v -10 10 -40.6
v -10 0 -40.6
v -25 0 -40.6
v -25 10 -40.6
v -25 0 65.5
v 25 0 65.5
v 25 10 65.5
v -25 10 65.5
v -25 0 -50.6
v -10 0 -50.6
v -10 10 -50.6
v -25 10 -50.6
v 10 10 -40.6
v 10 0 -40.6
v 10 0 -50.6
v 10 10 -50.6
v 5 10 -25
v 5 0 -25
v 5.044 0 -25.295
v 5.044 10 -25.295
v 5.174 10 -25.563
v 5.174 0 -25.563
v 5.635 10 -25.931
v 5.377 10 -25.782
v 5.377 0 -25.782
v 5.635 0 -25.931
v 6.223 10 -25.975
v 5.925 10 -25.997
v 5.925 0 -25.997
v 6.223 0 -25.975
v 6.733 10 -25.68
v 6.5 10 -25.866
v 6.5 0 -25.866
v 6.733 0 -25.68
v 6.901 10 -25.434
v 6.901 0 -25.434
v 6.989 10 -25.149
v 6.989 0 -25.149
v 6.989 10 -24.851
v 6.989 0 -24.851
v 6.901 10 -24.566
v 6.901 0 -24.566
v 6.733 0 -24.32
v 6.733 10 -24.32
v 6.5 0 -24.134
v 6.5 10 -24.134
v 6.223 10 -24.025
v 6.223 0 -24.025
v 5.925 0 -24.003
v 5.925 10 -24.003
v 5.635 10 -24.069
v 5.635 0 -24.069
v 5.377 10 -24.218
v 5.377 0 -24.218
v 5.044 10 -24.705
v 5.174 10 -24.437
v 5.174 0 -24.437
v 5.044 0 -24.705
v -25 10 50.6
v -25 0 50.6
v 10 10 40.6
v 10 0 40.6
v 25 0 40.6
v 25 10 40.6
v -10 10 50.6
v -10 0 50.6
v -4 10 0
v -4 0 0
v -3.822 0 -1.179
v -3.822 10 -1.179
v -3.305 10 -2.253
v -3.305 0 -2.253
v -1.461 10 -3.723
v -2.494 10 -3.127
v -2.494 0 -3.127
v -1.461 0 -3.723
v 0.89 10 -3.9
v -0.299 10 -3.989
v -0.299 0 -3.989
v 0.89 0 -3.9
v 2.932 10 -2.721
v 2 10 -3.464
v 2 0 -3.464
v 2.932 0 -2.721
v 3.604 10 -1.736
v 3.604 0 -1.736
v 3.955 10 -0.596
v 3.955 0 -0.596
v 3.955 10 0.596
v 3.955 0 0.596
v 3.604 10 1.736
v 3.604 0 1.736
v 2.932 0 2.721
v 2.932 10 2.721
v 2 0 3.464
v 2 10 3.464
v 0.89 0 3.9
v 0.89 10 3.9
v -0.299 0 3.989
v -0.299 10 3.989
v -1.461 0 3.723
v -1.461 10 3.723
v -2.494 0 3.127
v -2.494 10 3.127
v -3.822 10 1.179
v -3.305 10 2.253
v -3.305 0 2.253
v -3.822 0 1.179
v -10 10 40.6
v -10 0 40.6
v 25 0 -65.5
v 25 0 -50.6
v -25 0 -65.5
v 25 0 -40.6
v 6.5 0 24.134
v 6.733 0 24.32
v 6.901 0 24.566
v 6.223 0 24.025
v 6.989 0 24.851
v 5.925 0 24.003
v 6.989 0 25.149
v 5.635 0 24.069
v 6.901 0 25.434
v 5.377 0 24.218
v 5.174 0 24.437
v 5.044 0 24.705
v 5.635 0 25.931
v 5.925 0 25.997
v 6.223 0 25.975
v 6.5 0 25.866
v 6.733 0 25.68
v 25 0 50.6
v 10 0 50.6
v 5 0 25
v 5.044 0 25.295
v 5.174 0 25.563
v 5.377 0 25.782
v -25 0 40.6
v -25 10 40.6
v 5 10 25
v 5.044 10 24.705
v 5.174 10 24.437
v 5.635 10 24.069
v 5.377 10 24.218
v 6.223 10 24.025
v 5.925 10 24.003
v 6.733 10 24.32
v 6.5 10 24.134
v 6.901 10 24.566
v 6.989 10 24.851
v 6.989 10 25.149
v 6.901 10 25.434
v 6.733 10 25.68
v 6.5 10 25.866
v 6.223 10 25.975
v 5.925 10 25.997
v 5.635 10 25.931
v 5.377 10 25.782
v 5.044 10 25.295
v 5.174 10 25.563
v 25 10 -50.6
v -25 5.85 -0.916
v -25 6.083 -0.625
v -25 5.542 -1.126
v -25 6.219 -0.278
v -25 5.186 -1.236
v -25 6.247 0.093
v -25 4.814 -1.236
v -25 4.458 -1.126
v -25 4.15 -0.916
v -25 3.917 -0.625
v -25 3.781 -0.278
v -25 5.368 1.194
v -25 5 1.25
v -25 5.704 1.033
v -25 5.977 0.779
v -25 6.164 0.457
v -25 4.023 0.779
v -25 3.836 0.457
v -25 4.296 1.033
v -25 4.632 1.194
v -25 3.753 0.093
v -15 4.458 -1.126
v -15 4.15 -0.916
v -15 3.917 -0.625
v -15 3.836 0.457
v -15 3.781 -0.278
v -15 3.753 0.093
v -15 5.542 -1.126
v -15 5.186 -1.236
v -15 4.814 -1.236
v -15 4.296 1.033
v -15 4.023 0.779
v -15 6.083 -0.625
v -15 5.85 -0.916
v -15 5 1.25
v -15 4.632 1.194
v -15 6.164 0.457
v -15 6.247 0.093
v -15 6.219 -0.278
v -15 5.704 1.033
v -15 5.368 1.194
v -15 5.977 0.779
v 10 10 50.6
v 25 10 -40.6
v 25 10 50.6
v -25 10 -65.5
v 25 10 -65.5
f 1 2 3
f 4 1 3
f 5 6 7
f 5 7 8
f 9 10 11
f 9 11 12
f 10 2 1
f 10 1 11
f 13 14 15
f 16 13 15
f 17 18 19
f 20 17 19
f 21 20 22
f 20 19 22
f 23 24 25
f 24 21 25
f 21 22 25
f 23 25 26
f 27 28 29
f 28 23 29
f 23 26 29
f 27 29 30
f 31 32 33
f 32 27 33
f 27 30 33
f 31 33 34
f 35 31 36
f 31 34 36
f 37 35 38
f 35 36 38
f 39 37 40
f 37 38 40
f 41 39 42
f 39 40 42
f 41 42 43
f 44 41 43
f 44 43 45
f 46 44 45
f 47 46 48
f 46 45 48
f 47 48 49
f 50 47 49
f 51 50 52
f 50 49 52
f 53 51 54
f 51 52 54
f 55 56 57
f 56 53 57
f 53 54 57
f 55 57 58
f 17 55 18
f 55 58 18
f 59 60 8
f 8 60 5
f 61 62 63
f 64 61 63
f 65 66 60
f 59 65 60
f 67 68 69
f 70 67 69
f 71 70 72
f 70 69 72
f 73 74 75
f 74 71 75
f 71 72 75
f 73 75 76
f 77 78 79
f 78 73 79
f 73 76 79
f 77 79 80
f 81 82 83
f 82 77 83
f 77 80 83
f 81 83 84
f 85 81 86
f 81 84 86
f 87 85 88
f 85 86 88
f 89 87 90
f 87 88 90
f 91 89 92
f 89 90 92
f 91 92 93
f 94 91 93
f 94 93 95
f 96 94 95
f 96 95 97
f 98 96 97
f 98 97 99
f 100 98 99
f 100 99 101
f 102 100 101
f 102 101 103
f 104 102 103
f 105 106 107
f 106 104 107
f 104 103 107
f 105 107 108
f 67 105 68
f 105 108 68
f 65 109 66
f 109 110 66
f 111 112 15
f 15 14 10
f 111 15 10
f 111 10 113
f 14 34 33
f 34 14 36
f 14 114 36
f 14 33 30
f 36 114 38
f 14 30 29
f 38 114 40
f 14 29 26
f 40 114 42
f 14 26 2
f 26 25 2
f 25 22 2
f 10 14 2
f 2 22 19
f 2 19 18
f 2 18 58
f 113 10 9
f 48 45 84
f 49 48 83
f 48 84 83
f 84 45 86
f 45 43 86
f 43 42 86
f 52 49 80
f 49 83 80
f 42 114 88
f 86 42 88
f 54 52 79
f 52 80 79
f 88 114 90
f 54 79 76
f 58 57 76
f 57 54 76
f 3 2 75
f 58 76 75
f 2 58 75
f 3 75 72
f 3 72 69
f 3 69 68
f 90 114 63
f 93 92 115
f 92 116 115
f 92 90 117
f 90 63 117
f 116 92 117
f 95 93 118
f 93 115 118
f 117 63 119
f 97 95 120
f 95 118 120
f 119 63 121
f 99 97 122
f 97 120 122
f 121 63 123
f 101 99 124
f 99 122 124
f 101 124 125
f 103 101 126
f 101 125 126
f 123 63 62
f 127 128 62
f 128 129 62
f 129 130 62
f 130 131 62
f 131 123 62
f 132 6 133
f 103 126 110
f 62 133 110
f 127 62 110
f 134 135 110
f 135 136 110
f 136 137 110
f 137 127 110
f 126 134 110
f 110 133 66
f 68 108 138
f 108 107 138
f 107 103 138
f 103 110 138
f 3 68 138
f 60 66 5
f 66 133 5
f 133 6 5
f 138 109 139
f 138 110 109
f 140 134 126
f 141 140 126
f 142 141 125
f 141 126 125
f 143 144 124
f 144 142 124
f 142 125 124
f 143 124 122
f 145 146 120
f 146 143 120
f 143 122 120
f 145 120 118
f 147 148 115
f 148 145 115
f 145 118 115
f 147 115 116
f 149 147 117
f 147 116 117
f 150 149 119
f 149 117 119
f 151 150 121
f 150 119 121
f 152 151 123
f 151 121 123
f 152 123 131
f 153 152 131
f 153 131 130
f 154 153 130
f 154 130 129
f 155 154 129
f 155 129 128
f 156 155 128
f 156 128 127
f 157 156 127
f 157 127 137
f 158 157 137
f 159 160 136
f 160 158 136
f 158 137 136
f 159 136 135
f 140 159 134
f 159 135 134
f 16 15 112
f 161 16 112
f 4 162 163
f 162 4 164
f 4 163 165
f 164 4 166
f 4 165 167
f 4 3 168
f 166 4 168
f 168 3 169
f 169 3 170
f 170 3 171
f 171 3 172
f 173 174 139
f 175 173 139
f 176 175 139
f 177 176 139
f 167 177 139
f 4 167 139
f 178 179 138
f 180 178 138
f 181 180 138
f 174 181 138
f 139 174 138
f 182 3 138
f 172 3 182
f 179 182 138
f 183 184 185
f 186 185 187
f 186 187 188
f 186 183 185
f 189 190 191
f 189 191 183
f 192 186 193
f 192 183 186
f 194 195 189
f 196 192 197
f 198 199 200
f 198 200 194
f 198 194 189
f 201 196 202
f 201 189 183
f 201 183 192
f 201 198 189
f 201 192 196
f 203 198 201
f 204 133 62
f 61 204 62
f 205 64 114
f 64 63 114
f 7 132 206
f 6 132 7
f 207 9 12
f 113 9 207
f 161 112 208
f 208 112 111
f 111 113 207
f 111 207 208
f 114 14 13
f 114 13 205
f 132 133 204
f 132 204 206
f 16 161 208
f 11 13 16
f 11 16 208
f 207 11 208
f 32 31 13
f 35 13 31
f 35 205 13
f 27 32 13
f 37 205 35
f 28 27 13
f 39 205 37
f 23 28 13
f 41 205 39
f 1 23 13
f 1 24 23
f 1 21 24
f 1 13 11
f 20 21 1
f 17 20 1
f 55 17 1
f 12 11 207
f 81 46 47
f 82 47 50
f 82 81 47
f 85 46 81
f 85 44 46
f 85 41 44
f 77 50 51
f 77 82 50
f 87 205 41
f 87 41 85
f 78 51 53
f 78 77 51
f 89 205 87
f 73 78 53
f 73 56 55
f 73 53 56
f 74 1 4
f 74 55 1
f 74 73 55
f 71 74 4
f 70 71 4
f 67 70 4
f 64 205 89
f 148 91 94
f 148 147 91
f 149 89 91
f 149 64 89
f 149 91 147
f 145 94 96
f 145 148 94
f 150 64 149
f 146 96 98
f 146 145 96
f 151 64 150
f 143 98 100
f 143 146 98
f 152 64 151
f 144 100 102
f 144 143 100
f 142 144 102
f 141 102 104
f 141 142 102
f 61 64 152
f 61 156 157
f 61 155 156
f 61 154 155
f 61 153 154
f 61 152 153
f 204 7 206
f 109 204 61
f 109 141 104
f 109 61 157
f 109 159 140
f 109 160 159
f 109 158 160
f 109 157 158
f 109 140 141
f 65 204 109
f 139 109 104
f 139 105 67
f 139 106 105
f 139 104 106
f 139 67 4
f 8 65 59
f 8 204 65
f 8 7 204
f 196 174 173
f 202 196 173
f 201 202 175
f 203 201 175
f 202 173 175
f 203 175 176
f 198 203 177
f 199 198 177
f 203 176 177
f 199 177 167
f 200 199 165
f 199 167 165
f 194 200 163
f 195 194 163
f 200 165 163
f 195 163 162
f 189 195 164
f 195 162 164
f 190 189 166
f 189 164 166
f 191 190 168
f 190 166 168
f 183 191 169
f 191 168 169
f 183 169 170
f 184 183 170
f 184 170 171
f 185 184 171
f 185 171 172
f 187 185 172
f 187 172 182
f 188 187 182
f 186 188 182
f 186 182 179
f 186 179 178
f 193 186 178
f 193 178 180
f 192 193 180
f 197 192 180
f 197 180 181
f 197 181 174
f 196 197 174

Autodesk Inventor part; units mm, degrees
ref_plane "YZ Plane" through (0, 0, 0) normal (1, 0, 0) x (0, 1, 0)
ref_plane "XZ Plane" through (0, 0, 0) normal (0, 1, 0) x (-1, 0, 0)
ref_plane "XY Plane" through (0, 0, 0) normal (0, 0, 1) x (1, 0, 0)
sketch "Sketch1" plane through (0, 0, 0) normal (0, 1, 0) x (-1, 0, 0)
  line L0 (25, -65.5) -> (-25, -65.5)
  line L1 (-25, 65.5) -> (25, 65.5)
  circle A0 centre (0, 0) radius 4
  circle A1 centre (-6, -25) radius 1
  circle A2 centre (-6, 25) radius 1
  line L2 (-25, 65.5) -> (-10, 65.5)
  line L3 (-10, 50.6) -> (-25, 50.6)
  line L4 (-25, 50.6) -> (-25, 65.5)
  line L5 (-25, 65.5) -> (-10, 65.5)
  line L6 (-10, 40.6) -> (-25, 40.6)
  line L7 (-25, -65.5) -> (-10, -65.5)
  line L8 (-10, -40.6) -> (-25, -40.6)
  line L9 (-25, -65.5) -> (-10, -65.5)
  line L10 (-10, -50.6) -> (-25, -50.6)
  line L11 (-25, -50.6) -> (-25, -65.5)
  line L12 (25, -65.5) -> (10, -65.5)
  line L13 (10, -40.6) -> (25, -40.6)
  line L14 (25, -65.5) -> (10, -65.5)
  line L15 (10, -50.6) -> (25, -50.6)
  line L16 (25, -50.6) -> (25, -65.5)
  line L17 (25, 65.5) -> (10, 65.5)
  line L18 (10, 40.6) -> (25, 40.6)
  line L19 (25, 65.5) -> (10, 65.5)
  line L20 (10, 50.6) -> (25, 50.6)
  line L21 (25, 50.6) -> (25, 65.5)
  line L22 (-10, 50.6) -> (-10, 40.6)
  line L23 (-25, 40.6) -> (-25, -40.6)
  line L24 (-10, -40.6) -> (-10, -50.6)
  line L25 (10, -40.6) -> (10, -50.6)
  line L26 (25, -40.6) -> (25, 40.6)
  line L27 (10, 40.6) -> (10, 50.6)
  dimension "d0" = 50
  dimension "d1" = 131
  dimension "d4" = 8
  dimension "d10" = 2
  dimension "d18" = 14.9
  dimension "d19" = 15
  dimension "d20" = 24.9
  dimension "d21" = 15
  dimension "d22" = 24.9
  dimension "d24" = 14.9
  dimension "d25" = 15
  dimension "d26" = 24.9
  dimension "d28" = 14.9
  dimension "d29" = 15
  dimension "d30" = 24.9
  dimension "d32" = 14.9
extrude "Extrusion1" add sketch "Sketch1" along normal blind 10 contours L0 L11 L10 L24 L8 L23 L6 L22 L3 L4 L1 L21 L20 L27 L18 L26 L13 L25 L15 L16 | A0 | A1 | A2
extrude "Extrusion2" cut sketch "Sketch1" along normal blind 10 contours A0 | A1 | A2
sketch "Sketch3" plane through (-25, 0, -40.6) normal (-1, 0, 0) x (0, 0, 1)
  circle A0 centre (40.6, 5) radius 1.25
  point P0 (40.6, 0)
  dimension "d34" = 2.5
extrude "Extrusion4" cut sketch "Sketch3" against normal blind 10
properties part number "predni_komatex(0)"
